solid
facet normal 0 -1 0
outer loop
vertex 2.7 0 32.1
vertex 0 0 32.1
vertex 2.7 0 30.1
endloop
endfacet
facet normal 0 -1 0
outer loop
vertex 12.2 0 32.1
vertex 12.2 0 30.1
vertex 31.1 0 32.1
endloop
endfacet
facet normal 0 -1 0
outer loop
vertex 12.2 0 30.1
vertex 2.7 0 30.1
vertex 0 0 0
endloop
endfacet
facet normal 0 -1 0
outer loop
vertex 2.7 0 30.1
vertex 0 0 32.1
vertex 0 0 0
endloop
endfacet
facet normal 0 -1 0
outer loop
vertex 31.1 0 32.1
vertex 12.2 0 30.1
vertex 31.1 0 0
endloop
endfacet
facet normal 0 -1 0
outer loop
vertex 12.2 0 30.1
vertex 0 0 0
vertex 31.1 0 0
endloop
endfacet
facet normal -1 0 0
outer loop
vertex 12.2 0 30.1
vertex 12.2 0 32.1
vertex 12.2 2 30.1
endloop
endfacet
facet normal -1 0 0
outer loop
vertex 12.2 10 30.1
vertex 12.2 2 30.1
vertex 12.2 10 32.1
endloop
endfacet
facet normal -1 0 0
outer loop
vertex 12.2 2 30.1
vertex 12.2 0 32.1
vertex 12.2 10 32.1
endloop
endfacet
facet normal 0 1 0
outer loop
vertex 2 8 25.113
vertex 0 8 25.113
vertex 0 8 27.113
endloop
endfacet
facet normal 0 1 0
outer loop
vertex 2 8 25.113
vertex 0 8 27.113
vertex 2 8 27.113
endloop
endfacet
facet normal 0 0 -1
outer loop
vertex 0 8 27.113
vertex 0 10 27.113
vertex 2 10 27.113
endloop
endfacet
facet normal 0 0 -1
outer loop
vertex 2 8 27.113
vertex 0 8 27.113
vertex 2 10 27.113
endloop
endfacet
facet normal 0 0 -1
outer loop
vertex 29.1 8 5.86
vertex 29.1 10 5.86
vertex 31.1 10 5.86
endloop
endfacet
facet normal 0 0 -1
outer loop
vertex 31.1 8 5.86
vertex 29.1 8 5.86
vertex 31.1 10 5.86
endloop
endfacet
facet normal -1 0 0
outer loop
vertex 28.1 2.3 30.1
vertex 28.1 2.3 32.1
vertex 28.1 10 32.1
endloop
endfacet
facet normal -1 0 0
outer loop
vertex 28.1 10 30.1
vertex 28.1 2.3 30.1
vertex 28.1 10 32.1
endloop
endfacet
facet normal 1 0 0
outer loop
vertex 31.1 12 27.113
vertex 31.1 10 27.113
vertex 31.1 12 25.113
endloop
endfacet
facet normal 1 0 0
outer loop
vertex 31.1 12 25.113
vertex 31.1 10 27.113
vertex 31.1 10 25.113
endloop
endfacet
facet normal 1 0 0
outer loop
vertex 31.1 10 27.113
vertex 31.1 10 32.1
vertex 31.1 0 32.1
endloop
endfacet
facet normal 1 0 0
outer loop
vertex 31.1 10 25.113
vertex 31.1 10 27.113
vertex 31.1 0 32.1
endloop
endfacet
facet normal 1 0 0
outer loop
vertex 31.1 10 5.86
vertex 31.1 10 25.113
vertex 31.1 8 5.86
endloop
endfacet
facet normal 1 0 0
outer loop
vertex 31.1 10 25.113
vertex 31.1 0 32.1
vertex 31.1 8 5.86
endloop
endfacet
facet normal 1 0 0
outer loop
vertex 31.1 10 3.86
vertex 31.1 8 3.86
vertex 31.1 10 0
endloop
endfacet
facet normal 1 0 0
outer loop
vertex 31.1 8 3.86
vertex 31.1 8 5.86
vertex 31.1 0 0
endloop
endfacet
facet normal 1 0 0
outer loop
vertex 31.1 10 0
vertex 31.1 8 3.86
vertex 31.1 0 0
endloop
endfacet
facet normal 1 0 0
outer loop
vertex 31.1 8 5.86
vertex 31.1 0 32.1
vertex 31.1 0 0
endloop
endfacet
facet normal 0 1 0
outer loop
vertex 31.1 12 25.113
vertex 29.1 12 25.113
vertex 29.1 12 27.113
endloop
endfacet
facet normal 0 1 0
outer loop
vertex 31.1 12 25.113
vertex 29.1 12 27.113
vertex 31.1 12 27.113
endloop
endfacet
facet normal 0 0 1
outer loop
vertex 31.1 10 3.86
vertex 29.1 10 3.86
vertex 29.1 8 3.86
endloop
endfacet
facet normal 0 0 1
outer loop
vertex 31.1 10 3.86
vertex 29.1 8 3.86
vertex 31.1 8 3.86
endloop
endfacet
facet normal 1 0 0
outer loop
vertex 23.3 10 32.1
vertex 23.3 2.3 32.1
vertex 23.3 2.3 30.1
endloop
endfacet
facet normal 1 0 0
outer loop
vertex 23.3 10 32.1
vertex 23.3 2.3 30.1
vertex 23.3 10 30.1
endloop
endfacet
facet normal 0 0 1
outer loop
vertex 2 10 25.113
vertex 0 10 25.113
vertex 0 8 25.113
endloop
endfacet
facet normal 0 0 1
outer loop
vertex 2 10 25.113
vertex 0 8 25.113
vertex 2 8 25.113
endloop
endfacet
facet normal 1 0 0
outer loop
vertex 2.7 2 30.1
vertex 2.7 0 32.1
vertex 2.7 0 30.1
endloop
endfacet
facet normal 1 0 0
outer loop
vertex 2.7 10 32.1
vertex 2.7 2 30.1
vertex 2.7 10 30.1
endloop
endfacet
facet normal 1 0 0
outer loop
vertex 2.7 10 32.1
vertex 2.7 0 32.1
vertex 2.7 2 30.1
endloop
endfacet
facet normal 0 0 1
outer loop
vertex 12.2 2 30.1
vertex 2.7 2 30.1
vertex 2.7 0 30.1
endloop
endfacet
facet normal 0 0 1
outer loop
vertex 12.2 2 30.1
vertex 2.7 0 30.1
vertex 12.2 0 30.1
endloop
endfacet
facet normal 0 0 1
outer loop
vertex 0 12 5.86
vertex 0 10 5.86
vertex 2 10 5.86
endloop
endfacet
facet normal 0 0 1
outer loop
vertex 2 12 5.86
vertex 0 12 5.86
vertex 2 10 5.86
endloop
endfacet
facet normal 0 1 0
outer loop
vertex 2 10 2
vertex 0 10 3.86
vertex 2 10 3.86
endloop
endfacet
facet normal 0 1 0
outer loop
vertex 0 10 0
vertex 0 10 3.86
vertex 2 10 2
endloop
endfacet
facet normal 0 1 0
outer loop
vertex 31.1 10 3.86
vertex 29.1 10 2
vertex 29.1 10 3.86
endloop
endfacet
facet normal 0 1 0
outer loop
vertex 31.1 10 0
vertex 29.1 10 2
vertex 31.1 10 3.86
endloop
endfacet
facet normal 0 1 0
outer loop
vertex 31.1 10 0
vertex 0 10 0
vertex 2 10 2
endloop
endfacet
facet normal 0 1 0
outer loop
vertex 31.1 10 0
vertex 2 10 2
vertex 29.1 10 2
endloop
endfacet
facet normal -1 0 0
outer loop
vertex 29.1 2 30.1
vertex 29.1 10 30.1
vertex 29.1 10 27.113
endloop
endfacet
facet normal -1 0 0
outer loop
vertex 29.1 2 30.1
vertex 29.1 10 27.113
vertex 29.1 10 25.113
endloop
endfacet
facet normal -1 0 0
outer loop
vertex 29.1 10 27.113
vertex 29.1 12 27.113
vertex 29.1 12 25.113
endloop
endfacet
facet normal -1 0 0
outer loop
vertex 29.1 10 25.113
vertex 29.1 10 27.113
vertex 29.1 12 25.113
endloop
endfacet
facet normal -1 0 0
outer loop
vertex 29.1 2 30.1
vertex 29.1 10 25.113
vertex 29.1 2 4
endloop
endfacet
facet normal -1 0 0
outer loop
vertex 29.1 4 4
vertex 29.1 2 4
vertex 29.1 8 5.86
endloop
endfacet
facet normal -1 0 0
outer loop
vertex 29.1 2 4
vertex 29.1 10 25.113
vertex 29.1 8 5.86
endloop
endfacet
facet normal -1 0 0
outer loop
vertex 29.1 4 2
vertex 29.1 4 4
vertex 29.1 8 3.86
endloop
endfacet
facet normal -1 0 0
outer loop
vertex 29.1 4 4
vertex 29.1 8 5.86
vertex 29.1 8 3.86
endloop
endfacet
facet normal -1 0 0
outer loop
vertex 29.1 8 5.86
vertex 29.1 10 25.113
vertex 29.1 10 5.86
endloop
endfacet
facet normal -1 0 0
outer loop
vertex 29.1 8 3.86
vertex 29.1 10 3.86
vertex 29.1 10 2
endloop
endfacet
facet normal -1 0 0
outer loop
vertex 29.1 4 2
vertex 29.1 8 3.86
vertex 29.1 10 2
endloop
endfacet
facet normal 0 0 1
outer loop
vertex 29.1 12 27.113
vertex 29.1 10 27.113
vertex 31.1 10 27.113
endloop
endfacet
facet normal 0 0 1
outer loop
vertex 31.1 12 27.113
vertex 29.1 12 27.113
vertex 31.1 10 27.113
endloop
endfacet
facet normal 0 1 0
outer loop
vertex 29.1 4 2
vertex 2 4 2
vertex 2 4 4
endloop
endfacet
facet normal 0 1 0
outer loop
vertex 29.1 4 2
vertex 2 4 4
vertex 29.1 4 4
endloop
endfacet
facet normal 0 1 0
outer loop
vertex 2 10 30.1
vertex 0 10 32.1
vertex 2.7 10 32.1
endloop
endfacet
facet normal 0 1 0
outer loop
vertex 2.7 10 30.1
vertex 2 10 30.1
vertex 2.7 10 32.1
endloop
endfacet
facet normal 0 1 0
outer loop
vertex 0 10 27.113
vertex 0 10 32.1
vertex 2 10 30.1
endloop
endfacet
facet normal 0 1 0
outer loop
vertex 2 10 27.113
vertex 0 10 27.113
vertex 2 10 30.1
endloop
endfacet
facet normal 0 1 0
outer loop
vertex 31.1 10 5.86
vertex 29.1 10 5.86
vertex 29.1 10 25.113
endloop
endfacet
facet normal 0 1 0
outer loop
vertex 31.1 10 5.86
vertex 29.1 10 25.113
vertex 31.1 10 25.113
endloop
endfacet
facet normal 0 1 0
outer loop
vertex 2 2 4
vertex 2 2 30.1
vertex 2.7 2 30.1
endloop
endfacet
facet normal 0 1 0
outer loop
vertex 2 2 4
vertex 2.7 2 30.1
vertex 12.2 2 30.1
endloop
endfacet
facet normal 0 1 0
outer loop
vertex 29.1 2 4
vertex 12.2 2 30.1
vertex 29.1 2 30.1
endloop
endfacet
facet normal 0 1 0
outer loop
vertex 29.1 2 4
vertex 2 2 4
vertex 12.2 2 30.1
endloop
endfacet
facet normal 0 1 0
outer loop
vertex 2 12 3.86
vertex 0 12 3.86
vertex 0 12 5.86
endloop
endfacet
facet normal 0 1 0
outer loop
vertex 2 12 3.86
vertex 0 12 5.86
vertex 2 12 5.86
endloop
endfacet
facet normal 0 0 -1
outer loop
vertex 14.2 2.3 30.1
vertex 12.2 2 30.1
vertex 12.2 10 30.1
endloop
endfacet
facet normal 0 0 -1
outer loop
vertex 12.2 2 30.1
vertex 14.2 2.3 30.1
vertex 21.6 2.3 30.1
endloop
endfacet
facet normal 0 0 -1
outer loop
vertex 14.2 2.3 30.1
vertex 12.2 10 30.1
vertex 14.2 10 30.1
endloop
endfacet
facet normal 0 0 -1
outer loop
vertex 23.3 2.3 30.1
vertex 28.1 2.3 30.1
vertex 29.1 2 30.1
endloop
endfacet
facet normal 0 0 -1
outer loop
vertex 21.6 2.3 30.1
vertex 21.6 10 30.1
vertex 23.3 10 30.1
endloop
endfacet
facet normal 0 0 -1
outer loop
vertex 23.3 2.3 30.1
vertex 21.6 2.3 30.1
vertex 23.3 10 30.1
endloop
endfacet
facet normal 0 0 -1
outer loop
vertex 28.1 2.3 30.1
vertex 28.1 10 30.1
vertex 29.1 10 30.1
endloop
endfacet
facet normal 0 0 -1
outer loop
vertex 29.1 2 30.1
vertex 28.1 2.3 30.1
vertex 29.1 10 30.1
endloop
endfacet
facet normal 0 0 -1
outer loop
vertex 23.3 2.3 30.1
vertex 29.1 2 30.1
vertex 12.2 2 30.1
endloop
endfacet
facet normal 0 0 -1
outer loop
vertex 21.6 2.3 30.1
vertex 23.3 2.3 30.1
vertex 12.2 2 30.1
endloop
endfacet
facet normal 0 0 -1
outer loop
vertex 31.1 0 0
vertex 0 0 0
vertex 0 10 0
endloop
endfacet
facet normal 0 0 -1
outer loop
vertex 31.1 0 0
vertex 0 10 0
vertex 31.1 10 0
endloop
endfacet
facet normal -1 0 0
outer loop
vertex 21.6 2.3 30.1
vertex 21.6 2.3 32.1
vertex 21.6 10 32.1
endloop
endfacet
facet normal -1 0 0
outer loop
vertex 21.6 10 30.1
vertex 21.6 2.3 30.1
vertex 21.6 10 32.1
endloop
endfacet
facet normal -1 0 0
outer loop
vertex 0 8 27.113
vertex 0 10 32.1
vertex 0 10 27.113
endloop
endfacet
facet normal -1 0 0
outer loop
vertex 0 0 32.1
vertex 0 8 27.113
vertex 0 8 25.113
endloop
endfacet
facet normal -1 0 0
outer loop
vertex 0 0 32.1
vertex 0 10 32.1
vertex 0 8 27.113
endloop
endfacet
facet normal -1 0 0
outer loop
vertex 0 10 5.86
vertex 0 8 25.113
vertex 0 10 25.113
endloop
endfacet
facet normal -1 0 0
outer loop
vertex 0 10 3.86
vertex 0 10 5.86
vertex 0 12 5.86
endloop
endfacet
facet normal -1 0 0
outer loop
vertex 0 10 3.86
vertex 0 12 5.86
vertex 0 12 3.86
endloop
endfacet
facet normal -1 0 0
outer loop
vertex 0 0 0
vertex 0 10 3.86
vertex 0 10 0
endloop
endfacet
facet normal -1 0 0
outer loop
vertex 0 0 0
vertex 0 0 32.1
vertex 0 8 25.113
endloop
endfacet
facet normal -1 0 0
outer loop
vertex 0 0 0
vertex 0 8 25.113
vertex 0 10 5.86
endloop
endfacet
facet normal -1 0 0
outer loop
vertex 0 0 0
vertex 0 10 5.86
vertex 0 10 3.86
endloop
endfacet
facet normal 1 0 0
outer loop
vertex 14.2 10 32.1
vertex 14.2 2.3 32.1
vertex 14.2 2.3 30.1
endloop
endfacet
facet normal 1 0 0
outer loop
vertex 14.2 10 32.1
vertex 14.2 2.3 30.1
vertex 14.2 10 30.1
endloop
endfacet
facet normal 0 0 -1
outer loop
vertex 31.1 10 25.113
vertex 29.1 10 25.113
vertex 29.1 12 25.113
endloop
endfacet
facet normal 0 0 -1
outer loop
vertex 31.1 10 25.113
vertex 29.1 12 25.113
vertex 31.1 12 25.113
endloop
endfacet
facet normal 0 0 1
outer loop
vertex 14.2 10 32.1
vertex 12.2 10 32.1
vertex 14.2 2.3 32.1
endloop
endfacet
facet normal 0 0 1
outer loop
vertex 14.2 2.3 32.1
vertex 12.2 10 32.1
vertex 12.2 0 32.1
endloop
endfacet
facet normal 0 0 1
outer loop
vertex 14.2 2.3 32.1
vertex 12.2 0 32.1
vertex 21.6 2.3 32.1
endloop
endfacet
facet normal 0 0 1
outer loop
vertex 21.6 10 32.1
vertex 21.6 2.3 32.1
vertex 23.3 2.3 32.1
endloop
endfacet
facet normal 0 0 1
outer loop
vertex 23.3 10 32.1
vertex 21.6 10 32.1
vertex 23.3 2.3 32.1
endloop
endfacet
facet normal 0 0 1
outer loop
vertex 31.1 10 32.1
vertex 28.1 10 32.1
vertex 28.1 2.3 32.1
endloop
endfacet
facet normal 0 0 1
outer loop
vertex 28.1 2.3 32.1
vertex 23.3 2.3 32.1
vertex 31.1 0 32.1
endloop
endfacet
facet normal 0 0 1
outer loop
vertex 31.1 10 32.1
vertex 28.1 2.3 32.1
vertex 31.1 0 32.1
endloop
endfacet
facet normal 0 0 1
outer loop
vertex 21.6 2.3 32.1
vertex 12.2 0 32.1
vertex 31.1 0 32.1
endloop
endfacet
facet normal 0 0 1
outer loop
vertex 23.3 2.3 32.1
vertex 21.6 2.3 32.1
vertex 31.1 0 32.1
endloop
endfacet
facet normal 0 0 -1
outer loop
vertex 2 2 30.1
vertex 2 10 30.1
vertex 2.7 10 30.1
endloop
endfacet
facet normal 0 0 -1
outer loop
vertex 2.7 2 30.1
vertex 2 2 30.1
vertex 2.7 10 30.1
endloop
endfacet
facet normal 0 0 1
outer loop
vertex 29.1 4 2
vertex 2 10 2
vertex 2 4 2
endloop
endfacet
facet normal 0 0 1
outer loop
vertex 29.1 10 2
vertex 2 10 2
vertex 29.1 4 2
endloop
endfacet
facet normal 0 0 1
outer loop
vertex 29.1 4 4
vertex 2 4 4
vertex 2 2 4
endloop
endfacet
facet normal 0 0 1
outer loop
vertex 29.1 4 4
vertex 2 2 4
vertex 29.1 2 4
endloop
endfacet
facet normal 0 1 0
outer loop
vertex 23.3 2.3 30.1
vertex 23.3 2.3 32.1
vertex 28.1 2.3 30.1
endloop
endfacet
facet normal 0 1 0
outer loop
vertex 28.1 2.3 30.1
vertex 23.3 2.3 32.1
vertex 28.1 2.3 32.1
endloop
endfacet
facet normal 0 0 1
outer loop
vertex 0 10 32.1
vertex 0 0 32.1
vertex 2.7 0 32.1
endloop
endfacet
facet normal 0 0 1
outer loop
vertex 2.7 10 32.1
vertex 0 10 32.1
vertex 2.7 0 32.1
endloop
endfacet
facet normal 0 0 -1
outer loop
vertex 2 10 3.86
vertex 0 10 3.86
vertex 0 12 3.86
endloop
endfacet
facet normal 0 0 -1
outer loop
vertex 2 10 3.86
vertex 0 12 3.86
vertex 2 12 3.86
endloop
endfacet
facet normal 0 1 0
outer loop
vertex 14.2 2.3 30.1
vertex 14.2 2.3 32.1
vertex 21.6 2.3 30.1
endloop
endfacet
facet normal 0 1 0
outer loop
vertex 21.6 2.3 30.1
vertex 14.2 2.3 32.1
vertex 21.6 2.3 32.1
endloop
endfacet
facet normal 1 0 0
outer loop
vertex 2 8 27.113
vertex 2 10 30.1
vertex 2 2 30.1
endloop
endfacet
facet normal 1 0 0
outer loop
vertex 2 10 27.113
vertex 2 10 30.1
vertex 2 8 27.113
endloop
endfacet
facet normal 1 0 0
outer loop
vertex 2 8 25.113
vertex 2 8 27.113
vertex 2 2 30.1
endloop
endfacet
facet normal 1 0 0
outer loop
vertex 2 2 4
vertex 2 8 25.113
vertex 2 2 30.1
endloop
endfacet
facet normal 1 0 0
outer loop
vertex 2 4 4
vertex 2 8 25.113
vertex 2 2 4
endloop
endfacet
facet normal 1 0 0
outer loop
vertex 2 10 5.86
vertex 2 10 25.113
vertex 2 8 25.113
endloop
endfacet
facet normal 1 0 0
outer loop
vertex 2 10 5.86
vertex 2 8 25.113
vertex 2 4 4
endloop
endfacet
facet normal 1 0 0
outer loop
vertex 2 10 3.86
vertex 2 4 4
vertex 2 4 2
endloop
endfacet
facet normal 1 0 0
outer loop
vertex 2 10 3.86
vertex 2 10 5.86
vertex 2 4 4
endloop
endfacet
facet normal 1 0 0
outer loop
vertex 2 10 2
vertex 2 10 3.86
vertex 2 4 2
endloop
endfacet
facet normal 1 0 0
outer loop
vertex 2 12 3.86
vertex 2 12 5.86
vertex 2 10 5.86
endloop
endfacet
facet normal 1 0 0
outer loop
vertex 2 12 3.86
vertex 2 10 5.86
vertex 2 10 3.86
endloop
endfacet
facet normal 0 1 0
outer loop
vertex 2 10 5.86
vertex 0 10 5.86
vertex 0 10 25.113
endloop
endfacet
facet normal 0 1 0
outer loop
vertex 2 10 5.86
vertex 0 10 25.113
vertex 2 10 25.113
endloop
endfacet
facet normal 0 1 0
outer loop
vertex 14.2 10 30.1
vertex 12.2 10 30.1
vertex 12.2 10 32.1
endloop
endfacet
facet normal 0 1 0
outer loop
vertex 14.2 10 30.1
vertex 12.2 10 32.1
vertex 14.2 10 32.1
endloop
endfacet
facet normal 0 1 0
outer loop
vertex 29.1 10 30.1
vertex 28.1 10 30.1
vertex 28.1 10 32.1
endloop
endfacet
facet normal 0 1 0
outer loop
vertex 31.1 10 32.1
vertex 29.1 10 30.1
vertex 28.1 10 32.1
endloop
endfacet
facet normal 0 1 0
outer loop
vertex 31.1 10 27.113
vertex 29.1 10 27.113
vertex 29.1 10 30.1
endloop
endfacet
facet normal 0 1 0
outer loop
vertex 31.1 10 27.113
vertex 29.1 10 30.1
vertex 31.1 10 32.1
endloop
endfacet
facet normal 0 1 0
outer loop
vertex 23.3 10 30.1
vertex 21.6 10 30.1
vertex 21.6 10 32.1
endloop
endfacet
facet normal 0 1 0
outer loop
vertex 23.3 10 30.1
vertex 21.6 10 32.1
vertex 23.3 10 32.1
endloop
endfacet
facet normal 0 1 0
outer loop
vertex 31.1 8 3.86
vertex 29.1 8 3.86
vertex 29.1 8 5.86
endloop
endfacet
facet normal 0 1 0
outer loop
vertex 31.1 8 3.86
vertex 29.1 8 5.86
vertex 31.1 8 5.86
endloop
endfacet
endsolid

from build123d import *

# Parameters (mm, degrees)
SKETCH3_W            = 31.1
SKETCH3_H            = 32.1
SHELL_DEPTH          = 10
SKETCH4_W            = 27.1
SKETCH4_H            = 26.1
MAIN_CAVITY_DEPTH    = 8
SKETCH5_W            = 27.1
SKETCH5_H            = 2
SUPPORT_SHELF_DEPTH  = 6
SKETCH6_W            = 4.8
SKETCH6_H            = 7.7
SKETCH6_W_2          = 7.4
SKETCH6_W_3          = 9.5
SKETCH6_H_2          = 10
TERMINAL_INPUT_DEPTH = 2
SKETCH7_W            = 2
SKETCH7_H            = 2
MALE_TABS_DEPTH      = 2
SKETCH8_W            = 2
SKETCH8_H            = 2
CUT_EXTRUDE4_DEPTH   = 2


with BuildPart() as part:
    # Sketch3 → Shell (new body)
    with BuildSketch(Plane(origin=(0, 0, 0), x_dir=(1, 0, 0), z_dir=(0, 1, 0))):
        with Locations((15.55, -16.05)):
            Rectangle(SKETCH3_W, SKETCH3_H)
    extrude(amount=SHELL_DEPTH)

    # Sketch4 → Main Cavity (cut)
    with BuildSketch(Plane(origin=(0, 10, 0), x_dir=(1, 0, 0), z_dir=(0, 1, 0))):
        with Locations((15.55, -17.05)):
            Rectangle(SKETCH4_W, SKETCH4_H)
    extrude(amount=-MAIN_CAVITY_DEPTH, mode=Mode.SUBTRACT)

    # Sketch5 → Support Shelf (cut)
    with BuildSketch(Plane(origin=(0, 10, 0), x_dir=(1, 0, 0), z_dir=(0, 1, 0))):
        with Locations((15.55, -3)):
            Rectangle(SKETCH5_W, SKETCH5_H)
    extrude(amount=-SUPPORT_SHELF_DEPTH, mode=Mode.SUBTRACT)

    # Sketch6 → Terminal Input (cut)
    with BuildSketch(Plane.XY.offset(32.1)):
        with Locations((25.7, 6.15)):
            Rectangle(SKETCH6_W, SKETCH6_H)
        with Locations((17.9, 6.15)):
            Rectangle(SKETCH6_W_2, SKETCH6_H)
        with Locations((7.45, 5)):
            Rectangle(SKETCH6_W_3, SKETCH6_H_2)
    extrude(amount=-TERMINAL_INPUT_DEPTH, mode=Mode.SUBTRACT)

    # Sketch7 → Male Tabs (add)
    with BuildSketch(Plane(origin=(0, 10, 0), x_dir=(1, 0, 0), z_dir=(0, 1, 0))):
        with Locations((30.1, -26.112988121)):
            Rectangle(SKETCH7_W, SKETCH7_H)
        with Locations((1, -4.859742299)):
            Rectangle(SKETCH7_W, SKETCH7_H)
    extrude(amount=MALE_TABS_DEPTH)

    # Sketch8 → Cut-Extrude4 (cut)
    with BuildSketch(Plane(origin=(0, 10, 0), x_dir=(1, 0, 0), z_dir=(0, 1, 0))):
        with Locations((30.1, -4.859742299)):
            Rectangle(SKETCH8_W, SKETCH8_H)
        with Locations((1, -26.112988121)):
            Rectangle(SKETCH8_W, SKETCH8_H)
    extrude(amount=-CUT_EXTRUDE4_DEPTH, mode=Mode.SUBTRACT)


solid = part.part
